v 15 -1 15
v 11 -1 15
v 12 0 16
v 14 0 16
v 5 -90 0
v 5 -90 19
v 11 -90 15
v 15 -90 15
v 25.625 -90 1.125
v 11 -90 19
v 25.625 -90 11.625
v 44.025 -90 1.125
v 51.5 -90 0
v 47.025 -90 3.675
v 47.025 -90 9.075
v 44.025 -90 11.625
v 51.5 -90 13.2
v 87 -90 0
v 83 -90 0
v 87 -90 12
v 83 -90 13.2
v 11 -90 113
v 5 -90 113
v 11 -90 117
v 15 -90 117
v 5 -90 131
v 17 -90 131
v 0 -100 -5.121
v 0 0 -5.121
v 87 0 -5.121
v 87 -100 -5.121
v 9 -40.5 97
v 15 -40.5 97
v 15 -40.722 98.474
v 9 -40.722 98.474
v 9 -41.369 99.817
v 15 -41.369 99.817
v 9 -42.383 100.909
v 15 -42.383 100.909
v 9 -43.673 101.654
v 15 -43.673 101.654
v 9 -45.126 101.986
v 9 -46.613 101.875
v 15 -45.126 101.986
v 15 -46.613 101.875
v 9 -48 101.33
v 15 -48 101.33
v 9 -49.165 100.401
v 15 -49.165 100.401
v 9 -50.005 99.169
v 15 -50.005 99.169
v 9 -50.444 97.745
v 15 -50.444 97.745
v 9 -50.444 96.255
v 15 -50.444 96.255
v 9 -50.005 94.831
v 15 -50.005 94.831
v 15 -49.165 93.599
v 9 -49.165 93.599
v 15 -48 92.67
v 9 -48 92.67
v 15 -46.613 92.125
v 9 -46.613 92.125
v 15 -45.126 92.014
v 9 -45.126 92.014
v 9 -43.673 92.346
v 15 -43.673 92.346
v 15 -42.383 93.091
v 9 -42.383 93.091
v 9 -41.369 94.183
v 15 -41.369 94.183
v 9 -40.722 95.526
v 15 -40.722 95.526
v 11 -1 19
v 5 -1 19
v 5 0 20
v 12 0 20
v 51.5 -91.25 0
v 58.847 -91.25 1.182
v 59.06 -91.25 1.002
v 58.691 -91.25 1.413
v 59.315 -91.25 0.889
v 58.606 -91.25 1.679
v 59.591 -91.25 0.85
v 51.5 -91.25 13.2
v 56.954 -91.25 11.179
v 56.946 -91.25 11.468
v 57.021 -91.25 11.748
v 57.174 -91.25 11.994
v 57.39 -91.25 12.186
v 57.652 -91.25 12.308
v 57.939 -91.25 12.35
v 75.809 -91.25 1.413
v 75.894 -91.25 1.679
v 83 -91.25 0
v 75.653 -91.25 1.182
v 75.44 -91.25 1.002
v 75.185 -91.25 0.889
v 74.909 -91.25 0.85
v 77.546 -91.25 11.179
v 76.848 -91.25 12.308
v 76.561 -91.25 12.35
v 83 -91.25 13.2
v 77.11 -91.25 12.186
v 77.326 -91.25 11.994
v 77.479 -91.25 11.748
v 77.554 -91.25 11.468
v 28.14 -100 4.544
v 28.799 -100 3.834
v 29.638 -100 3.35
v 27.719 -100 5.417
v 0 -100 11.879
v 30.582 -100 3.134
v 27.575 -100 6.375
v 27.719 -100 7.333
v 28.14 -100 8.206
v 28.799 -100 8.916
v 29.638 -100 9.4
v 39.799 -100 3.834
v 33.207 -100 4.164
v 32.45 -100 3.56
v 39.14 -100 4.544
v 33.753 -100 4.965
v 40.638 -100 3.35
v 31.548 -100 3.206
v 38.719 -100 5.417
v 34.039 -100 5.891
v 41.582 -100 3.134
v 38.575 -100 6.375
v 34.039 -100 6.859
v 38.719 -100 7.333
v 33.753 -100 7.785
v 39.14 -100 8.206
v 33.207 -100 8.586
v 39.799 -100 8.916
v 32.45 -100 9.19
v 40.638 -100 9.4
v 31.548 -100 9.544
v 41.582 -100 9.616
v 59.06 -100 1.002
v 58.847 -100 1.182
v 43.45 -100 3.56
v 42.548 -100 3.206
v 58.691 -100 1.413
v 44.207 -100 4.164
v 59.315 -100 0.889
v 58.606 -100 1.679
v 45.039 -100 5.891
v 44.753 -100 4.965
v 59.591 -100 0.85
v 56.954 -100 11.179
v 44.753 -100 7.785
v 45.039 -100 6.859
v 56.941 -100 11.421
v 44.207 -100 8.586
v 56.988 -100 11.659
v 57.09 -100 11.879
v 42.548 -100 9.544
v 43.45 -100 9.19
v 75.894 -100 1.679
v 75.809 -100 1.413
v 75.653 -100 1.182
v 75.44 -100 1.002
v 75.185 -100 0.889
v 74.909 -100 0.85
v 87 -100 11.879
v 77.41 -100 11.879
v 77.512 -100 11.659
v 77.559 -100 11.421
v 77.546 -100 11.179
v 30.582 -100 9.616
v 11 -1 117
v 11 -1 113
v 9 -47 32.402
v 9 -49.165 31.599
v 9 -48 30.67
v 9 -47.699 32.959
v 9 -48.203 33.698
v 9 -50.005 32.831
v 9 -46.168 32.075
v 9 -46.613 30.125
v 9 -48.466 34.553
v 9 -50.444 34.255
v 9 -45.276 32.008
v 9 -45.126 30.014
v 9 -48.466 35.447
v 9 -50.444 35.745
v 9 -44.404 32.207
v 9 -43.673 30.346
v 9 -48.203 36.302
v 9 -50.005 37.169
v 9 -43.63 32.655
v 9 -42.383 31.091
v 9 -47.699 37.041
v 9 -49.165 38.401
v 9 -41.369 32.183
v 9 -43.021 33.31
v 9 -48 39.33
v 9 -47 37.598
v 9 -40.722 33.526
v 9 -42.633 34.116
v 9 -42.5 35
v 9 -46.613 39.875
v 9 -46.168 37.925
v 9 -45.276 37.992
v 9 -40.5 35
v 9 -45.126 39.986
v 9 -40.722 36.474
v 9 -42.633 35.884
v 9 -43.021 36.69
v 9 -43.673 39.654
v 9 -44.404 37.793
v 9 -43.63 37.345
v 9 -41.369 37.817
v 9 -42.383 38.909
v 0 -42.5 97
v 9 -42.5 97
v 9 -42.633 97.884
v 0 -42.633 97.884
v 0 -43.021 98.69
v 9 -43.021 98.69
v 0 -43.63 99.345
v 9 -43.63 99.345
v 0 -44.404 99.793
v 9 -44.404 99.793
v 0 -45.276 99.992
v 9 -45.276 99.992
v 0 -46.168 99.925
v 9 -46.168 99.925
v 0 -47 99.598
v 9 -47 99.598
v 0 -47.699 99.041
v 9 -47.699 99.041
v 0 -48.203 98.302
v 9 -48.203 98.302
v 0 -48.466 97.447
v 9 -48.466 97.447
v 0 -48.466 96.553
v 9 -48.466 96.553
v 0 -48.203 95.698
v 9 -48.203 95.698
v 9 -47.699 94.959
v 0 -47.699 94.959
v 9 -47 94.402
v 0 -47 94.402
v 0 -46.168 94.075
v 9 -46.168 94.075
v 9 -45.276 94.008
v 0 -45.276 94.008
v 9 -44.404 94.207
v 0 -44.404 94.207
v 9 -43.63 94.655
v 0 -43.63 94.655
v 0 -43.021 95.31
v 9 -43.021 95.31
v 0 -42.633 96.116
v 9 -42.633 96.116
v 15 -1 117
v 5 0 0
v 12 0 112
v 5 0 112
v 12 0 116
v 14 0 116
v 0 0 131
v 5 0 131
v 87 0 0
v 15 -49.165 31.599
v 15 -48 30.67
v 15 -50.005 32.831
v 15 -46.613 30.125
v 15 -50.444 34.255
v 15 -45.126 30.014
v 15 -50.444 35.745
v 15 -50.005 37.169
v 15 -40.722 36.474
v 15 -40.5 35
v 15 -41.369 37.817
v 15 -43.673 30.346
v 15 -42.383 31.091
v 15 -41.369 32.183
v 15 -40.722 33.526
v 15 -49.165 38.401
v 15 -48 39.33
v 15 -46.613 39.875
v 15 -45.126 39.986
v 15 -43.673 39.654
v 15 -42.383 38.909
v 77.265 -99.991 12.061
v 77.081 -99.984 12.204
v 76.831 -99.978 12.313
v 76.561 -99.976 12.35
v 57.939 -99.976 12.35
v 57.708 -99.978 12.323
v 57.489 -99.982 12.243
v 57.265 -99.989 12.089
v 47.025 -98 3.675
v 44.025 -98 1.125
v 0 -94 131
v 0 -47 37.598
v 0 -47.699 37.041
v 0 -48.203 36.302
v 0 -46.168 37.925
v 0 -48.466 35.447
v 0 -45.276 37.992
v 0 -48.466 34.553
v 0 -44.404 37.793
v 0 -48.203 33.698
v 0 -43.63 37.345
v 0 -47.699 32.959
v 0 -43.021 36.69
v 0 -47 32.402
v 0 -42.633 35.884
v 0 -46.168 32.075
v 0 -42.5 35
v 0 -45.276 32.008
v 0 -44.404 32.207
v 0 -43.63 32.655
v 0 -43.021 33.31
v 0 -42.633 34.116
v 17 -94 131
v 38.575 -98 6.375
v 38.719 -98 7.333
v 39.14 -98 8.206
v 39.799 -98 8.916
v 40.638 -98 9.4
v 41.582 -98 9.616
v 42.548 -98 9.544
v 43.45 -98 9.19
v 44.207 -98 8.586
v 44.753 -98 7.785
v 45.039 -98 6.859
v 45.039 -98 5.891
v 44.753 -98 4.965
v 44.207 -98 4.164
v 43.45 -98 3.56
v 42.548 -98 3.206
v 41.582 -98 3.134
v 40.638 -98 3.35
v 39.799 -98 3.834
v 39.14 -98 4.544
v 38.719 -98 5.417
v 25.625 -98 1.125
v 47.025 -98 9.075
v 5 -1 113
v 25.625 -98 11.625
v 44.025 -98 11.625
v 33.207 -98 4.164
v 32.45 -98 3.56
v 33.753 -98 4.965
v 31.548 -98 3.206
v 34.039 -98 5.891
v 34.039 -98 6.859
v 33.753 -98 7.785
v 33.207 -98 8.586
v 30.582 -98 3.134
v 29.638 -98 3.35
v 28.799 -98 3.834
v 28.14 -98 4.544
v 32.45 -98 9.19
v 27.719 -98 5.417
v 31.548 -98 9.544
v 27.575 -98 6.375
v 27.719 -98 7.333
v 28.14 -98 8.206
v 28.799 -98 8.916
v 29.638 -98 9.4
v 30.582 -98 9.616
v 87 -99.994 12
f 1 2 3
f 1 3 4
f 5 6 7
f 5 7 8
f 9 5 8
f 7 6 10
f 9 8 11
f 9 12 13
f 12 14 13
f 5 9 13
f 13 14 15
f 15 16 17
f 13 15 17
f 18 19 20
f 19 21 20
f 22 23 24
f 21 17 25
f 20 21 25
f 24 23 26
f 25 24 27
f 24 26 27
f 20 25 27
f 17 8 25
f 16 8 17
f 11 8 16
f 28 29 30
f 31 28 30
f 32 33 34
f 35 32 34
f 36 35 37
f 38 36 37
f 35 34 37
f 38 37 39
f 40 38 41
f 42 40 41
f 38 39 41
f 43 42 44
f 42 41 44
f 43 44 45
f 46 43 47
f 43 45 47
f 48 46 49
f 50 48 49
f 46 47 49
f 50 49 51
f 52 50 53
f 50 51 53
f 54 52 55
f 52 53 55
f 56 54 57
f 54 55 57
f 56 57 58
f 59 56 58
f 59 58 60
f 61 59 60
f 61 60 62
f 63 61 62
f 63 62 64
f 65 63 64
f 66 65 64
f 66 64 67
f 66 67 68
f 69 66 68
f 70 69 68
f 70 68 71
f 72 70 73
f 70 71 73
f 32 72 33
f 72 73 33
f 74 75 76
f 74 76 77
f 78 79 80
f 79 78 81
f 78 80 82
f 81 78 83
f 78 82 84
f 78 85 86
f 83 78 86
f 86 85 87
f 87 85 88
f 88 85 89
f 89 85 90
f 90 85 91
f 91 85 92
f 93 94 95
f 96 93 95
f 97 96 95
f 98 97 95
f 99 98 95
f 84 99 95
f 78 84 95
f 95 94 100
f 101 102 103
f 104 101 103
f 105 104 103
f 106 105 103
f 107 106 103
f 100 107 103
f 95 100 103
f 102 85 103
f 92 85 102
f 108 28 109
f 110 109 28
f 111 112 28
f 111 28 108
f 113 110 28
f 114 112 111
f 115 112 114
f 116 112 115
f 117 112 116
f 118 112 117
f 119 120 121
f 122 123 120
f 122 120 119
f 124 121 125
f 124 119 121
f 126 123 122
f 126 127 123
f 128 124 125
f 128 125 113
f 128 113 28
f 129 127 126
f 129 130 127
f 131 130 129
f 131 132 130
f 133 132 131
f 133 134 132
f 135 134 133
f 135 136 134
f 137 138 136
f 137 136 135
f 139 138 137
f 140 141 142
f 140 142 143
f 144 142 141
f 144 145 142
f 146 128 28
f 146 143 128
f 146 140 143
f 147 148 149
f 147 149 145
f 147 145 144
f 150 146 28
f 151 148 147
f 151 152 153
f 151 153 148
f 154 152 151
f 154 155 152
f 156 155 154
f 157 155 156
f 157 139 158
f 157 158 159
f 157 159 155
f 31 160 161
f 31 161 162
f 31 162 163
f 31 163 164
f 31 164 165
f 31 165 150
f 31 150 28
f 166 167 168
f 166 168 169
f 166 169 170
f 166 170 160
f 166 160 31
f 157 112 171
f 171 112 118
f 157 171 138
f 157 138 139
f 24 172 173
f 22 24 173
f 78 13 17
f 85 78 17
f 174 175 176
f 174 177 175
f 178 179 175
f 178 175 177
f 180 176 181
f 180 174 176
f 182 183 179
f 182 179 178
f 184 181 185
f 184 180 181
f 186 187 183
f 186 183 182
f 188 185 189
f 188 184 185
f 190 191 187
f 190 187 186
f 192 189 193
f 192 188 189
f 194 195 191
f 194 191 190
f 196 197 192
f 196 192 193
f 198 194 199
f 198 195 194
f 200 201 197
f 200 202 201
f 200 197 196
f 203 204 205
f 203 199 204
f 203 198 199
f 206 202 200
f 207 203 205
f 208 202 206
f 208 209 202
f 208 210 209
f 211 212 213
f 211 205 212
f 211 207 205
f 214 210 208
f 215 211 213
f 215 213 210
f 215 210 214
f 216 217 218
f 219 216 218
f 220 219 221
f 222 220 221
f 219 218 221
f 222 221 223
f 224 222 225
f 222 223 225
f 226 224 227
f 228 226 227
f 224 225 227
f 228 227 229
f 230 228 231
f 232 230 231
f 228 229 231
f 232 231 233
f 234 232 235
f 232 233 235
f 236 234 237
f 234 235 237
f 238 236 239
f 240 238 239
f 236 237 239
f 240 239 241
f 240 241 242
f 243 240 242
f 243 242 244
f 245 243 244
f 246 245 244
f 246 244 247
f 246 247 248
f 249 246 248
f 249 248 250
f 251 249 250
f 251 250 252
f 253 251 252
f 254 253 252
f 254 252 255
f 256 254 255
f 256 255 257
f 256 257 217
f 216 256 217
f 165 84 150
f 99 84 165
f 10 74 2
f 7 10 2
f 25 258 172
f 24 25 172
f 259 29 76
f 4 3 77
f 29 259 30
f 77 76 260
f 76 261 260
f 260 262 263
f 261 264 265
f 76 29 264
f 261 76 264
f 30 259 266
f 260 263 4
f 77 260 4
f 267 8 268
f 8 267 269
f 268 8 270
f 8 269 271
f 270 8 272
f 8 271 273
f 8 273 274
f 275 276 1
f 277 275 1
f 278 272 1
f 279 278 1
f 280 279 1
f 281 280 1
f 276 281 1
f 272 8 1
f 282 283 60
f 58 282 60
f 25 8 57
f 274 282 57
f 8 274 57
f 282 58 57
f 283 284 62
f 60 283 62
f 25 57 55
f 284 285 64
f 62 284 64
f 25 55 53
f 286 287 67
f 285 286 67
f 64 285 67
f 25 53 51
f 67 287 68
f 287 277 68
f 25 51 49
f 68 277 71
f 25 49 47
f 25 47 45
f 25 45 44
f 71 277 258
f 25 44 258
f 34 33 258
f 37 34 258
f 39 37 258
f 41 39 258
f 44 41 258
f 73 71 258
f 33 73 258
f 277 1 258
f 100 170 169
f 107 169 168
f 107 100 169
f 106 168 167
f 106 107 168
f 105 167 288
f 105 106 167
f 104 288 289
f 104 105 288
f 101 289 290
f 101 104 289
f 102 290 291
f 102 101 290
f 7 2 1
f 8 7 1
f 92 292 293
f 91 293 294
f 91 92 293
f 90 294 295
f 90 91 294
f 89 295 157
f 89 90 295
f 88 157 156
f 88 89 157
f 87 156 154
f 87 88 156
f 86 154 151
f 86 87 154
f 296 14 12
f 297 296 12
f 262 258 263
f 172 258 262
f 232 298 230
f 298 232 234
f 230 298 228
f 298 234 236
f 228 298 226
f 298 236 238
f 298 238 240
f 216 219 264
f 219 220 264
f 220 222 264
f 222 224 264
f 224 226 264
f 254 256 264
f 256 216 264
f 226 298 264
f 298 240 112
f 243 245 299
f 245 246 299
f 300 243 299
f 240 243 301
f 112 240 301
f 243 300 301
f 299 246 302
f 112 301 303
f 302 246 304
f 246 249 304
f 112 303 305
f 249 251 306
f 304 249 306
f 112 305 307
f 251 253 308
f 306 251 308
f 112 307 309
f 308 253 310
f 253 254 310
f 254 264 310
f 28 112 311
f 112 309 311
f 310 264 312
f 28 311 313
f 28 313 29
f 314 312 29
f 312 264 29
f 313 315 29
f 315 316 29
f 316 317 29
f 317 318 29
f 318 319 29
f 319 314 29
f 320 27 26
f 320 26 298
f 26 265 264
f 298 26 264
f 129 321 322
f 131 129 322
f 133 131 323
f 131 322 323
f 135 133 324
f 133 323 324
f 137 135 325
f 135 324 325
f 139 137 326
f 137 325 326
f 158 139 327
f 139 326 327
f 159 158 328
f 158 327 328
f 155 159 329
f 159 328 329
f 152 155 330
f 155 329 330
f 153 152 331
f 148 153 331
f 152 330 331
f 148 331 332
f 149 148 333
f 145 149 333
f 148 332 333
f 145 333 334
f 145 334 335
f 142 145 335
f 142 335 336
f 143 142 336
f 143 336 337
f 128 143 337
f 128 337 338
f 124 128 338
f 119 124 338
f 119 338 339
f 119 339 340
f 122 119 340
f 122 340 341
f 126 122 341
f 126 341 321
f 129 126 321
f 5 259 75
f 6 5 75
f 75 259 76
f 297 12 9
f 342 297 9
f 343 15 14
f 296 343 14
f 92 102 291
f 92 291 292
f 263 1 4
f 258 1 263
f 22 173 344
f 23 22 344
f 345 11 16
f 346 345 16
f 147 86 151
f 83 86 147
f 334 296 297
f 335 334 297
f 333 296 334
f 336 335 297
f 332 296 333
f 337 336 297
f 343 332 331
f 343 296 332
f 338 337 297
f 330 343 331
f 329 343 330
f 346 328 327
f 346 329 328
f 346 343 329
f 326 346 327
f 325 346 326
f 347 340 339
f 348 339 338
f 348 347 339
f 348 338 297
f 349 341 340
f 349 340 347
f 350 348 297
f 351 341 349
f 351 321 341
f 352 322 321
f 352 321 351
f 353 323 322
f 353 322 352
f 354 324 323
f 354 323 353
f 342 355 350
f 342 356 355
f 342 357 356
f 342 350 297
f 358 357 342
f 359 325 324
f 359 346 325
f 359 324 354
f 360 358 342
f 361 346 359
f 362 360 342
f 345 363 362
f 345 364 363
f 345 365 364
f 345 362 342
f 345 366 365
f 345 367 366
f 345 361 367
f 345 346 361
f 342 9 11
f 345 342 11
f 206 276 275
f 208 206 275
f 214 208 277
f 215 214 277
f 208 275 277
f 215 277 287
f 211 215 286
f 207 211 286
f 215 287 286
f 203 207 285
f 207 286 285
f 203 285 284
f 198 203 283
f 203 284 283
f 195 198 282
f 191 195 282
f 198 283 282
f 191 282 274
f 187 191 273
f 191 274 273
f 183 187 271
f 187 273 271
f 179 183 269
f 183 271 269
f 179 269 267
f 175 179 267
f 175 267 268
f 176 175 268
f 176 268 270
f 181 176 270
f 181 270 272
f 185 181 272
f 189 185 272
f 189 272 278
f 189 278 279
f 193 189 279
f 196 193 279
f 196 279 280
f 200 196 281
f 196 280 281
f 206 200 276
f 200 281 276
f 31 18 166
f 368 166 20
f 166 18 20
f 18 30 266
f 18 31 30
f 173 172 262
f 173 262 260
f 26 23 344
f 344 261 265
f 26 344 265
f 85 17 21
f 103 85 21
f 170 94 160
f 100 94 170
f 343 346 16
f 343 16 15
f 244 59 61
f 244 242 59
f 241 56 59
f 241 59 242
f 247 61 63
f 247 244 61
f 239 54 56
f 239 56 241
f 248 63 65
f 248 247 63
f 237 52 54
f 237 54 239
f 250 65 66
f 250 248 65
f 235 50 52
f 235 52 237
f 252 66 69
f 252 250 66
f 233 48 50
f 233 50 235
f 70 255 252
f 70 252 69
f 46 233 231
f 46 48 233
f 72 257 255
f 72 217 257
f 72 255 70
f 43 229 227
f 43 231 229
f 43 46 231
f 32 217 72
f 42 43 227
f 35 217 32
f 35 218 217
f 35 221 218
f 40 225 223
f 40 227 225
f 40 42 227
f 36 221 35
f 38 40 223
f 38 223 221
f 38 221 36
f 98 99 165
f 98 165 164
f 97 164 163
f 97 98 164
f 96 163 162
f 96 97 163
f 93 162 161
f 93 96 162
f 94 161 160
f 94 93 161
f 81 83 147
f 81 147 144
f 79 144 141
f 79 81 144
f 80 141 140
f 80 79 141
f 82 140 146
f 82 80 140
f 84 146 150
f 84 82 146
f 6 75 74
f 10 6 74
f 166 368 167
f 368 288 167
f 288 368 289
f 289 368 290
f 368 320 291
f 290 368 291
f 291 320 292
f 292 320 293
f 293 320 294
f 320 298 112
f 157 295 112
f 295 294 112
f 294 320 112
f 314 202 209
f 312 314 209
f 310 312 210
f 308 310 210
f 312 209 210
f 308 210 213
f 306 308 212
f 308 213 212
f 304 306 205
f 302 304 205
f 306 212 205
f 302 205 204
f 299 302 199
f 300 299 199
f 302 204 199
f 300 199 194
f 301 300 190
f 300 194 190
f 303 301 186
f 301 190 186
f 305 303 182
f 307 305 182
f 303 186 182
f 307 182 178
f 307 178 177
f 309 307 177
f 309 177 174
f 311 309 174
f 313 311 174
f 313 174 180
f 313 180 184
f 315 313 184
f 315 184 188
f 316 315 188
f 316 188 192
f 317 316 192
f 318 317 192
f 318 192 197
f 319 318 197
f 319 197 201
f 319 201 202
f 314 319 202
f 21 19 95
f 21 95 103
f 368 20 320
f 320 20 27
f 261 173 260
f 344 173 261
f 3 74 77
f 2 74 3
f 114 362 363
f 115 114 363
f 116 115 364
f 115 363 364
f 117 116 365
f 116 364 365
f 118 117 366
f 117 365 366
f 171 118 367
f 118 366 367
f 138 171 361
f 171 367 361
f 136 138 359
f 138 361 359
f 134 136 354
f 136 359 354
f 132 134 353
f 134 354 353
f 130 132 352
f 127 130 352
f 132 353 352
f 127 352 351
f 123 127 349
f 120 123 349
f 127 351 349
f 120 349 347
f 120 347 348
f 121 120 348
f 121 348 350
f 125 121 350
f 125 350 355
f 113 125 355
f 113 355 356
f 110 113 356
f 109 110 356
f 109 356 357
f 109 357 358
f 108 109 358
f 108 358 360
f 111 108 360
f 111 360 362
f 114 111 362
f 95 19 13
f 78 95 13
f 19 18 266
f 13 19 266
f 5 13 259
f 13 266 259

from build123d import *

# Parameters (mm, degrees)
F1_DEPTH  = 90
F3_DEPTH  = 10
F5_DEPTH  = 90
F6_SIZE   = 1
F8_DEPTH  = 8
F9_R      = 3.25
F10_DEPTH = 25
F12_DEPTH = 25
F11_W     = 31.5
F11_H     = 13.2
F13_DEPTH = 1.25
F14_R     = 5
F14_R_2   = 3
F15_DEPTH = 6
F16_DEPTH = 25


with BuildPart() as f1:
    # F0 (on Front) → F1 (new body)
    with BuildSketch(Plane.XZ):
        Polygon((5, 131), (0, 131), (0, 0), (5, 0), (5, 19), (11, 19), (11, 15), (15, 15), (15, 117), (11, 117), (11, 113), (5, 113), align=None)
        Polygon((5, 0), (0, 0), (0, -5.121096503), (87, -5.121096503), (87, 0), align=None)
    extrude(amount=F1_DEPTH)

    # F2 (on face) → F3 (join)
    with BuildSketch(Plane.XZ.offset(90)):
        Polygon((87, -5.121096503), (87, 0), (5, 0), (5, 19), (11, 19), (11, 15), (15, 15), (15, 117), (11, 117), (11, 113), (5, 113), (5, 131), (0, 131), (0, -5.121096503), align=None)
        Polygon((5, 0), (87, 0), (87, 12), (17, 131), (5, 131), (5, 113), (11, 113), (11, 117), (15, 117), (15, 15), (11, 15), (11, 19), (5, 19), align=None)
    extrude(amount=F3_DEPTH)

    # F4 (on face) → F5 (cut)
    with BuildSketch(Plane(origin=(0, 0, 0), x_dir=(0, -1, 0), z_dir=(-1, 0, 0))):
        Polygon((100, 131), (94, 131), (100, 11.878903497), align=None)
    extrude(amount=-F5_DEPTH, mode=Mode.SUBTRACT)

    # F6
    f6_edges = [f1.edges().sort_by_distance(p)[0] for p in [
        (8, 0, 113),
        (11, 0, 115),
        (13, 0, 117),
        (15, 0, 66),
        (13, 0, 15),
        (11, 0, 17),
        (8, 0, 19),
    ]]
    chamfer(f6_edges, length=F6_SIZE)

    # F7 (on face) → F8 (cut)
    with BuildSketch(Plane(origin=(0, -90, 0), x_dir=(-1, 0, 0), z_dir=(0, 1, 0))):
        Polygon((-25.625, 1.125), (-25.625, 11.625), (-44.025, 11.625), (-47.025, 9.075), (-47.025, 3.675), (-44.025, 1.125), align=None)
    extrude(amount=-F8_DEPTH, mode=Mode.SUBTRACT)

    # F9 (on face) → F10 (cut)
    with BuildSketch(Plane(origin=(0, -98, 0), x_dir=(-1, 0, 0), z_dir=(0, 1, 0))):
        with Locations((-41.825, 6.375)):
            Circle(F9_R)
        with Locations((-30.825, 6.375)):
            Circle(F9_R)
    extrude(amount=-F10_DEPTH, mode=Mode.SUBTRACT)

    # F11 (on face) → F12 (cut)
    with BuildSketch(Plane.XZ.offset(90)):
        with BuildLine():
            ThreePointArc((58.6058854217, 1.6786588252), (58.9474129273, 1.0847088218), (59.5910971765, 0.85))
            Line((59.5910971765, 0.85), (74.9089028235, 0.85))
            ThreePointArc((74.9089028235, 0.85), (75.5525870727, 1.0847088218), (75.8941145783, 1.6786588252))
            Line((75.8941145783, 1.6786588252), (77.5462884913, 11.1786588252))
            ThreePointArc((77.5462884913, 11.1786588252), (77.3263679147, 11.9936842492), (76.5610767365, 12.35))
            Line((76.5610767365, 12.35), (57.9389232635, 12.35))
            ThreePointArc((57.9389232635, 12.35), (57.1736320853, 11.9936842492), (56.9537115087, 11.1786588252))
            Line((56.9537115087, 11.1786588252), (58.6058854217, 1.6786588252))
        make_face()
    extrude(amount=F12_DEPTH, mode=Mode.SUBTRACT)

    # F11 (on face) → F13 (cut)
    with BuildSketch(Plane.XZ.offset(90)):
        with Locations((67.25, 6.6)):
            Rectangle(F11_W, F11_H)
        with BuildLine():
            Line((74.9089028235, 0.85), (59.5910971765, 0.85))
            ThreePointArc((59.5910971765, 0.85), (58.9474129273, 1.0847088218), (58.6058854217, 1.6786588252))
            Line((58.6058854217, 1.6786588252), (56.9537115087, 11.1786588252))
            ThreePointArc((56.9537115087, 11.1786588252), (57.1736320853, 11.9936842492), (57.9389232635, 12.35))
            Line((57.9389232635, 12.35), (76.5610767365, 12.35))
            ThreePointArc((76.5610767365, 12.35), (77.3263679147, 11.9936842492), (77.5462884913, 11.1786588252))
            Line((77.5462884913, 11.1786588252), (75.8941145783, 1.6786588252))
            ThreePointArc((75.8941145783, 1.6786588252), (75.5525870727, 1.0847088218), (74.9089028235, 0.85))
        make_face(mode=Mode.SUBTRACT)
    extrude(amount=F13_DEPTH, mode=Mode.SUBTRACT)

    # F14 (on face) → F15 (cut)
    with BuildSketch(Plane.YZ.offset(15)):
        with Locations((-45.5, 97)):
            Circle(F14_R)
        with Locations((-45.5, 97)):
            Circle(F14_R_2, mode=Mode.SUBTRACT)
        with Locations((-45.5, 35)):
            Circle(F14_R)
        with Locations((-45.5, 35)):
            Circle(F14_R_2, mode=Mode.SUBTRACT)
    extrude(amount=-F15_DEPTH, mode=Mode.SUBTRACT)

    # F16 (cut): faces of the model
    f16_faces = [f1.faces().sort_by_distance(p)[0] for p in [
        (15, -45.5, 97),
        (15, -45.5, 35),
    ]]
    extrude(f16_faces, amount=-F16_DEPTH, mode=Mode.SUBTRACT)


solid = f1.part
